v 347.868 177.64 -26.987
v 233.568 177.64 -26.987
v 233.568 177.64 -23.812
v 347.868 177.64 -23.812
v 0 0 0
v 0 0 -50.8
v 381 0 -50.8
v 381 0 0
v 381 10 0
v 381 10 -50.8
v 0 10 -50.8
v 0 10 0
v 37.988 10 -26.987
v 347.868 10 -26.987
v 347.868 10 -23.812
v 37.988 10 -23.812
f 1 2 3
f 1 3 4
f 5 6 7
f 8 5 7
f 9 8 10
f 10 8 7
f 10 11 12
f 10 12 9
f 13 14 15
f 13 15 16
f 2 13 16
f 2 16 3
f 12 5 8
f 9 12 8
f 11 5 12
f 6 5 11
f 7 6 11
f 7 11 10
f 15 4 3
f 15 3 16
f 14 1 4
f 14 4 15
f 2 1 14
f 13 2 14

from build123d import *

# Parameters (mm, degrees)
SKETCH1_W                = 381
SKETCH1_H                = 50.8
BOSS_EXTRUDE1_DEPTH      = 10
BOSS_EXTRUDE2_DEPTH      = 1.5875
BOSS_EXTRUDE2_DEPTH_BACK = 1.5875


with BuildPart() as part:
    # Sketch1 → Boss-Extrude1 (new body)
    with BuildSketch(Plane(origin=(0, 0, 0), x_dir=(1, 0, 0), z_dir=(0, 1, 0))):
        with Locations((190.5, 25.4)):
            Rectangle(SKETCH1_W, SKETCH1_H)
    extrude(amount=BOSS_EXTRUDE1_DEPTH)


with BuildPart() as body_2:
    # Sketch2 → Boss-Extrude2 (new, two sides: drawn at the far end of the back side and taken through both)
    with BuildSketch(Plane.XY.offset(-25.4).offset(-BOSS_EXTRUDE2_DEPTH_BACK)):
        Polygon((347.867965721, 10), (37.987965721, 10), (233.567965721, 177.64), (347.867965721, 177.64), align=None)
    extrude(amount=BOSS_EXTRUDE2_DEPTH + BOSS_EXTRUDE2_DEPTH_BACK)


solid = Compound([part.part, body_2.part])
